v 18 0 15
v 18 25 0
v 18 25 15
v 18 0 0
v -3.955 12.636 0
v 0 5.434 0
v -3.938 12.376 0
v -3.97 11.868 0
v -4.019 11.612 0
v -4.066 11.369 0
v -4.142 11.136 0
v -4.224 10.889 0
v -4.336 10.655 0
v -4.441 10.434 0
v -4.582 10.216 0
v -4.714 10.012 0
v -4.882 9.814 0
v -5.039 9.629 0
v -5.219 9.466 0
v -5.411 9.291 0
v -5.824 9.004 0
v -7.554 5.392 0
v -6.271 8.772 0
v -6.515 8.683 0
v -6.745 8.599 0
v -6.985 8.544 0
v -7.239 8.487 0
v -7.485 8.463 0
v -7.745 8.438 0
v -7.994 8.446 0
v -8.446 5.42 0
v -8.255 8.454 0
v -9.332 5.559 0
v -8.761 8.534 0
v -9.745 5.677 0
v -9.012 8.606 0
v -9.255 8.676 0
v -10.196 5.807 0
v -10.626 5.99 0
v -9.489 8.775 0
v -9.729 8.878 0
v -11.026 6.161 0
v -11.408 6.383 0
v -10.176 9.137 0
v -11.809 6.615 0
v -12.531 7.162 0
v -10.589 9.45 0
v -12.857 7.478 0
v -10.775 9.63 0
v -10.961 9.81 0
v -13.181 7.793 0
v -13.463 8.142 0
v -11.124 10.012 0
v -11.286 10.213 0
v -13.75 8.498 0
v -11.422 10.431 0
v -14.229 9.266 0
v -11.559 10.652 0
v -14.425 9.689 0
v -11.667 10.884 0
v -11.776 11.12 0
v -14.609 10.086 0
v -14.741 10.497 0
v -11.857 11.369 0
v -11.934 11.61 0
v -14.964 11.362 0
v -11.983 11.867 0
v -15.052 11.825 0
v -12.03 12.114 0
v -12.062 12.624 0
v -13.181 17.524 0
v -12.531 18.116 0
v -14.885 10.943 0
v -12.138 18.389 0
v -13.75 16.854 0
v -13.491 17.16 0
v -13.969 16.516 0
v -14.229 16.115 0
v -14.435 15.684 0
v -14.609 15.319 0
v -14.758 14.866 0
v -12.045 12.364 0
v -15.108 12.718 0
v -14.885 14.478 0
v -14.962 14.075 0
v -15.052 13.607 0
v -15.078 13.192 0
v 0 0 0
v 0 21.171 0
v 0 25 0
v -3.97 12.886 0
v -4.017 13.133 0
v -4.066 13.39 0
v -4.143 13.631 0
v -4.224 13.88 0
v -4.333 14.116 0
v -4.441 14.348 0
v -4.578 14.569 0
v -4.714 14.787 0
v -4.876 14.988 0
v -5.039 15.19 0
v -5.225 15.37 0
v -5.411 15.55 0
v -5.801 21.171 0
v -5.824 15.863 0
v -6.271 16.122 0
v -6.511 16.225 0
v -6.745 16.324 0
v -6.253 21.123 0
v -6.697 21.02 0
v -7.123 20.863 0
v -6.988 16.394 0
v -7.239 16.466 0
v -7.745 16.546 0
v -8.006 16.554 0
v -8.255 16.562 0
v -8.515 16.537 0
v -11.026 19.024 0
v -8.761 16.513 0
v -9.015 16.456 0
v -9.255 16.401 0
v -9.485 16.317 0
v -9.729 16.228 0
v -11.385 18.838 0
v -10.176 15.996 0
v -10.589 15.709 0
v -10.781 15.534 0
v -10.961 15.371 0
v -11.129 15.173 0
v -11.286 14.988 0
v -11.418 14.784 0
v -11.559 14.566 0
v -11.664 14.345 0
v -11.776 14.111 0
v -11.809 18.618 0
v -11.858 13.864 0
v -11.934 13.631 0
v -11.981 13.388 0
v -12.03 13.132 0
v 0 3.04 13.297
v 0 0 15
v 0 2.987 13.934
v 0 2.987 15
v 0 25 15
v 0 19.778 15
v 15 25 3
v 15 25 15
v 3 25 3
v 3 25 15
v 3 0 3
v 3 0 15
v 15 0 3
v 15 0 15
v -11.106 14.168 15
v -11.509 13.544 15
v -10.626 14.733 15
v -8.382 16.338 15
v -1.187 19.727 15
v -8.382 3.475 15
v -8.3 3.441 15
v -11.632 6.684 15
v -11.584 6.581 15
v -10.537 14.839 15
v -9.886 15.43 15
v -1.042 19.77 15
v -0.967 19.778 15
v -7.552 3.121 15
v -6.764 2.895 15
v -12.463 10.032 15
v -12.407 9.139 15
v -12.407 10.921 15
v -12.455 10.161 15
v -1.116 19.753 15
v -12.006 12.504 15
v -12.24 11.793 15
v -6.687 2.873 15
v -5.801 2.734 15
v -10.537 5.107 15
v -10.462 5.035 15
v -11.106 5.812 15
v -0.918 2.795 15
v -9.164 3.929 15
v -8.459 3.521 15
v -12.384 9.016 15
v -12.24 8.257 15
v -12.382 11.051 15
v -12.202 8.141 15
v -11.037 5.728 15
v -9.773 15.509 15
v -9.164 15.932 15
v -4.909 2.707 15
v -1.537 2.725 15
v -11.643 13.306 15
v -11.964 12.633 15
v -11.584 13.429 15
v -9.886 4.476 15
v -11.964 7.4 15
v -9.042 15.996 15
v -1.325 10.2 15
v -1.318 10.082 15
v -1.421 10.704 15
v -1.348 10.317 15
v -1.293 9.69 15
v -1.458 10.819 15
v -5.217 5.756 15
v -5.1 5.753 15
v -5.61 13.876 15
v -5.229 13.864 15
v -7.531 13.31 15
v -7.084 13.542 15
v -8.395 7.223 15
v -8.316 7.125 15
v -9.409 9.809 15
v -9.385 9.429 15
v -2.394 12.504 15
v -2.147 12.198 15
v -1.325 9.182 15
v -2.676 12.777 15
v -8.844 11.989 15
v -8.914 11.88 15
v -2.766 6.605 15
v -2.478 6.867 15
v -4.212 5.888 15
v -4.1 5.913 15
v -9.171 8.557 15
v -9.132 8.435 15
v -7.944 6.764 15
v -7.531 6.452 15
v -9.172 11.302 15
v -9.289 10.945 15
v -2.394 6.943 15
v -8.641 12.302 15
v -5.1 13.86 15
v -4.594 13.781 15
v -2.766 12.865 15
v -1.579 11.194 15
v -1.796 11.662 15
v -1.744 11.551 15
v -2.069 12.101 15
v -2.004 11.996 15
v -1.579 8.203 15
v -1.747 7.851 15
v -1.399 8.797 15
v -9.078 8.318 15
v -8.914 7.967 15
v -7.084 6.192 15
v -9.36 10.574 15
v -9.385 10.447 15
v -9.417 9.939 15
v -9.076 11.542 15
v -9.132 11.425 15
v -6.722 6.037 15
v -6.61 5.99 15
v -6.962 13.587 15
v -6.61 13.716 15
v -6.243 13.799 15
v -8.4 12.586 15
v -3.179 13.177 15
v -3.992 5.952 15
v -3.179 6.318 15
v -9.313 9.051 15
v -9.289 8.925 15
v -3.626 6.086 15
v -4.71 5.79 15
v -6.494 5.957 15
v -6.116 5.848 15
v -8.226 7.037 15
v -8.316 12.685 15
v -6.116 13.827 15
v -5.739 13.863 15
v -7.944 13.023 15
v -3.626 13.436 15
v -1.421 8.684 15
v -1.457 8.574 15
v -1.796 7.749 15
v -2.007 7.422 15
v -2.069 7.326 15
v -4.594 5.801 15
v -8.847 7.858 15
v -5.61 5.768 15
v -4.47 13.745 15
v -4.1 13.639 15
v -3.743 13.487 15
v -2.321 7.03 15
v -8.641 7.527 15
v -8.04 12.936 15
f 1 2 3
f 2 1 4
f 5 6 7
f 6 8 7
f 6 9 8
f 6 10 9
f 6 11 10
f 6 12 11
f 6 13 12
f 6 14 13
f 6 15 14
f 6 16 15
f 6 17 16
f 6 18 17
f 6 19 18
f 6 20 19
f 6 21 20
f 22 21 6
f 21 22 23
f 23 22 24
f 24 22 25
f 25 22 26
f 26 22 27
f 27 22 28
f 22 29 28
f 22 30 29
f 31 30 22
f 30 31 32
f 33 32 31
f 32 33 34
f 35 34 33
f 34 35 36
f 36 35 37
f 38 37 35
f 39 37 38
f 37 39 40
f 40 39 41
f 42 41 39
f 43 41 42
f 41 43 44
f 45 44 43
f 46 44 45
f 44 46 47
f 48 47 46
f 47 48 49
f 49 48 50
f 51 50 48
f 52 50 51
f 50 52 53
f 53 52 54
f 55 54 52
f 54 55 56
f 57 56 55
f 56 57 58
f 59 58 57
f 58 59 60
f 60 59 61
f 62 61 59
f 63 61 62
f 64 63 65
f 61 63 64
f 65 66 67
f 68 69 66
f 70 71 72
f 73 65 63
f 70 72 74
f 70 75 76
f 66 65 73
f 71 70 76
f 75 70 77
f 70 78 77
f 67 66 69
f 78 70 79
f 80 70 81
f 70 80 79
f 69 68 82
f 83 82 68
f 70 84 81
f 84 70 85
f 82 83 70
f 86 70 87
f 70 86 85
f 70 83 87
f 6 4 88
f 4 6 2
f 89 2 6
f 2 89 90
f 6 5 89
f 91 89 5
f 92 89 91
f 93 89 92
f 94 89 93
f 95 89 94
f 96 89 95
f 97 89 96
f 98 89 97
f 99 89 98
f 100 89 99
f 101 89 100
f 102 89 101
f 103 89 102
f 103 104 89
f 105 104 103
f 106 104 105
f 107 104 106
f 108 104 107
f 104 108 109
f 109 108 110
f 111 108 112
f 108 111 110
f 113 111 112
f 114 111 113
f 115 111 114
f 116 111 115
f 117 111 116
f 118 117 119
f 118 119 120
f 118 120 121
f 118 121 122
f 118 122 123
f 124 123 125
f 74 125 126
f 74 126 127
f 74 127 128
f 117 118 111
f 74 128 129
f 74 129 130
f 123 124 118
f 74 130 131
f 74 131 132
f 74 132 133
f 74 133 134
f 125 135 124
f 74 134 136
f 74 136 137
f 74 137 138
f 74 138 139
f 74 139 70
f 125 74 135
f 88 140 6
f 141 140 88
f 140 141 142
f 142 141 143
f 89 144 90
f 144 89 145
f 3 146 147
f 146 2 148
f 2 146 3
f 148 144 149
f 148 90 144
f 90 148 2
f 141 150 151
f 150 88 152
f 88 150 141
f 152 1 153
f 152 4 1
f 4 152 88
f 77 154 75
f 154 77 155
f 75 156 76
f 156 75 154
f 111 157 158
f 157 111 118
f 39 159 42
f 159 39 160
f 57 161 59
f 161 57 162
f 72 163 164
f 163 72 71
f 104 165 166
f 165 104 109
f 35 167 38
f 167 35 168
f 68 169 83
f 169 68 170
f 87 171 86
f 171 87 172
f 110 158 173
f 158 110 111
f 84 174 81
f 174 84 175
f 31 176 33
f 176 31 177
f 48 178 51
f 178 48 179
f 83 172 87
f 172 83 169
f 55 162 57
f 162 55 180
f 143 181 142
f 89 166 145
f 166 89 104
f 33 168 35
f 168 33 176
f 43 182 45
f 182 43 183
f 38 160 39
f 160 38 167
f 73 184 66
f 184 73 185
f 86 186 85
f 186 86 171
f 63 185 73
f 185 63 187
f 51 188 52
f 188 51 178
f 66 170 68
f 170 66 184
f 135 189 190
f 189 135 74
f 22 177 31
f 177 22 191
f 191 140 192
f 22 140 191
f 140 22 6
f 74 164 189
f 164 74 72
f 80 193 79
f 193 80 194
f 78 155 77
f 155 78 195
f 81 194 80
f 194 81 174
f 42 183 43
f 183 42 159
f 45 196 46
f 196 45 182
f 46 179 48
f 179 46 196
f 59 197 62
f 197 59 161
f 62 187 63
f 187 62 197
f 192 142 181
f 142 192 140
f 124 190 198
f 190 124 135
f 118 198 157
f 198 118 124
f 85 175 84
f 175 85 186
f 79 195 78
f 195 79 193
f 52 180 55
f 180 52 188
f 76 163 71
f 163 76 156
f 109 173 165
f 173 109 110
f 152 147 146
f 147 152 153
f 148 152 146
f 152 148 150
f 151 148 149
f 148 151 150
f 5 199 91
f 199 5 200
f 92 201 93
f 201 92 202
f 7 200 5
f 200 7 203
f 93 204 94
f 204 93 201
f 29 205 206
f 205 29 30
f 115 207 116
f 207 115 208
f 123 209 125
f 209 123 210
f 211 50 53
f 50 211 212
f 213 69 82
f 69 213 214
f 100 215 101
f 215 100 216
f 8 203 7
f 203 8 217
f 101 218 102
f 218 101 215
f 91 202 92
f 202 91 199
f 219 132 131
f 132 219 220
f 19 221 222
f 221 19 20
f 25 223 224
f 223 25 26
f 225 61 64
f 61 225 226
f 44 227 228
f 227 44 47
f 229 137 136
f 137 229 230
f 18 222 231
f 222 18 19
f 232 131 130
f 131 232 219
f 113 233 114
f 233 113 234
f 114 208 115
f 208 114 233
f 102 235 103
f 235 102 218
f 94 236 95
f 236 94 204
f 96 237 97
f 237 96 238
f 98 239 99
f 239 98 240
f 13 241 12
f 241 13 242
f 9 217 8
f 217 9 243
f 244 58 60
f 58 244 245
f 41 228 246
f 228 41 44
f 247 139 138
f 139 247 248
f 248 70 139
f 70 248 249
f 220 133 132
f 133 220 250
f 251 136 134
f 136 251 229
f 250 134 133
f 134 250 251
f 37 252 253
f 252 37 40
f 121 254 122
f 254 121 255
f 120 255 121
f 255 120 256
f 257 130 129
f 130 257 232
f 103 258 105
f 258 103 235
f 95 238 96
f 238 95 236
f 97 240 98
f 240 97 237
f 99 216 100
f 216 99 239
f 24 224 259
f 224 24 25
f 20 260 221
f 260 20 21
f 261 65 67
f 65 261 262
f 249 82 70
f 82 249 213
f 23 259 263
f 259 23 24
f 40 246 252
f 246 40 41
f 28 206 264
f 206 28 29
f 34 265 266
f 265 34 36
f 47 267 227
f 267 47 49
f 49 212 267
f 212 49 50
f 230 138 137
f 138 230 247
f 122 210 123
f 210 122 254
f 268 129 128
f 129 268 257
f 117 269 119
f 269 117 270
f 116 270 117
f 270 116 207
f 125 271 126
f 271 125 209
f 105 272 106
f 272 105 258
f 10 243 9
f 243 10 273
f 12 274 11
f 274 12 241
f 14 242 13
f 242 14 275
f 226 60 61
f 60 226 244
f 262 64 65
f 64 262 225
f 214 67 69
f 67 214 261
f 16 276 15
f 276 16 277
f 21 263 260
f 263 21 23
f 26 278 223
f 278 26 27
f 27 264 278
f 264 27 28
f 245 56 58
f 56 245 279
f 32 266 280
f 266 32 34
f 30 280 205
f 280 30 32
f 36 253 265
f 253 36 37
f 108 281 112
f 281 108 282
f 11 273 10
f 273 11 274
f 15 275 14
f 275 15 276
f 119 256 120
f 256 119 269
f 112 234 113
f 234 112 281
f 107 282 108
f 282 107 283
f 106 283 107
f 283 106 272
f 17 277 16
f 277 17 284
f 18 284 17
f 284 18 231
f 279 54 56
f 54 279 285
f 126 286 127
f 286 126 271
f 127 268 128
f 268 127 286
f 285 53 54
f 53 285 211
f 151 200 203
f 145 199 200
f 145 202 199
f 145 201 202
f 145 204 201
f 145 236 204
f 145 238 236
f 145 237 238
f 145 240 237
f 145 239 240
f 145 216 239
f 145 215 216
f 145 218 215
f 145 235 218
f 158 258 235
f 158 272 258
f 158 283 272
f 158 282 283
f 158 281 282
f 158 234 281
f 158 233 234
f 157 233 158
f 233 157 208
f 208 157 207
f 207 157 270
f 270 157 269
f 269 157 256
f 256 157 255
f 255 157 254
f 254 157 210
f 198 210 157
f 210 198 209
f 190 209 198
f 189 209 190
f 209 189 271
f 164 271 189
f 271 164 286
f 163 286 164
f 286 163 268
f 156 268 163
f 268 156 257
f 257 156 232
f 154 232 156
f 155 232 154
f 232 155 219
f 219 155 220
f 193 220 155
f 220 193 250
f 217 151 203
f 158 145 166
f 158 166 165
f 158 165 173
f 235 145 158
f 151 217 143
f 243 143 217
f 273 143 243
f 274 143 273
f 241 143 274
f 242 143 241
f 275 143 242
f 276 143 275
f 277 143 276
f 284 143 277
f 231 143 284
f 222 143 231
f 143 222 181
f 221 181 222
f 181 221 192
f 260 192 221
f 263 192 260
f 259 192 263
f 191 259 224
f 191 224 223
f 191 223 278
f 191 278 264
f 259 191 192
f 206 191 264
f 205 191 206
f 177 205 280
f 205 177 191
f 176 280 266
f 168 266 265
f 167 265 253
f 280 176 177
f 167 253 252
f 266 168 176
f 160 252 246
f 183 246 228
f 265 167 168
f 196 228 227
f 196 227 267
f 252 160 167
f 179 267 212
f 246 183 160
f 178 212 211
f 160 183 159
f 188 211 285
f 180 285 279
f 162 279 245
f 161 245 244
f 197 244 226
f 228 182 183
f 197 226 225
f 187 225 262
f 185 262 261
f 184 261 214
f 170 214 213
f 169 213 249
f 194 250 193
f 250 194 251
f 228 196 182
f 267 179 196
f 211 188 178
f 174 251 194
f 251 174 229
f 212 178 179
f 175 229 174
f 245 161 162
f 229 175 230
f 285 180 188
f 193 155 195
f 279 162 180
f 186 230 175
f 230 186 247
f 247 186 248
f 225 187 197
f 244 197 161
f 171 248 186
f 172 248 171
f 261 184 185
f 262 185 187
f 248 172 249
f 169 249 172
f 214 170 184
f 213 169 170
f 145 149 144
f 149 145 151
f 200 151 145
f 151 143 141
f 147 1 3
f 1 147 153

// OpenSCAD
PIPE_DIA = 8;
PIPE_HOLDER_LENGTH = 20;
PIPE_ANGLE = [10, 10, 0];

WALL_THICKNESS = 3;
WIDTH = 12;
LENGTH = 25;
HEIGHT = 15;


$fn = 50;

module adapter() {
    intersection() {
        difference() {
            union() {
                cube([WIDTH + 2 * WALL_THICKNESS, LENGTH, HEIGHT + WALL_THICKNESS]);

                hull() {
                    translate([0, (LENGTH - PIPE_DIA - 2 * WALL_THICKNESS)/2, 0])
                    cube([WIDTH, PIPE_DIA + 2 * WALL_THICKNESS, HEIGHT + WALL_THICKNESS]);

                    translate([-PIPE_DIA, LENGTH/2, 0])
                    rotate(PIPE_ANGLE)
                    cylinder(d = PIPE_DIA + 2 * WALL_THICKNESS, h = PIPE_HOLDER_LENGTH * 2, center = true);
                }
            }

            #translate([WALL_THICKNESS, 0, WALL_THICKNESS])
            cube([WIDTH, LENGTH, HEIGHT]);

            #translate([-PIPE_DIA, LENGTH/2, 0])
            rotate(PIPE_ANGLE)
            cylinder(d = PIPE_DIA, h = PIPE_HOLDER_LENGTH * 3, center = true);
        }

        cylinder(d = 3 * LENGTH, h = HEIGHT);
    }
}

adapter();
